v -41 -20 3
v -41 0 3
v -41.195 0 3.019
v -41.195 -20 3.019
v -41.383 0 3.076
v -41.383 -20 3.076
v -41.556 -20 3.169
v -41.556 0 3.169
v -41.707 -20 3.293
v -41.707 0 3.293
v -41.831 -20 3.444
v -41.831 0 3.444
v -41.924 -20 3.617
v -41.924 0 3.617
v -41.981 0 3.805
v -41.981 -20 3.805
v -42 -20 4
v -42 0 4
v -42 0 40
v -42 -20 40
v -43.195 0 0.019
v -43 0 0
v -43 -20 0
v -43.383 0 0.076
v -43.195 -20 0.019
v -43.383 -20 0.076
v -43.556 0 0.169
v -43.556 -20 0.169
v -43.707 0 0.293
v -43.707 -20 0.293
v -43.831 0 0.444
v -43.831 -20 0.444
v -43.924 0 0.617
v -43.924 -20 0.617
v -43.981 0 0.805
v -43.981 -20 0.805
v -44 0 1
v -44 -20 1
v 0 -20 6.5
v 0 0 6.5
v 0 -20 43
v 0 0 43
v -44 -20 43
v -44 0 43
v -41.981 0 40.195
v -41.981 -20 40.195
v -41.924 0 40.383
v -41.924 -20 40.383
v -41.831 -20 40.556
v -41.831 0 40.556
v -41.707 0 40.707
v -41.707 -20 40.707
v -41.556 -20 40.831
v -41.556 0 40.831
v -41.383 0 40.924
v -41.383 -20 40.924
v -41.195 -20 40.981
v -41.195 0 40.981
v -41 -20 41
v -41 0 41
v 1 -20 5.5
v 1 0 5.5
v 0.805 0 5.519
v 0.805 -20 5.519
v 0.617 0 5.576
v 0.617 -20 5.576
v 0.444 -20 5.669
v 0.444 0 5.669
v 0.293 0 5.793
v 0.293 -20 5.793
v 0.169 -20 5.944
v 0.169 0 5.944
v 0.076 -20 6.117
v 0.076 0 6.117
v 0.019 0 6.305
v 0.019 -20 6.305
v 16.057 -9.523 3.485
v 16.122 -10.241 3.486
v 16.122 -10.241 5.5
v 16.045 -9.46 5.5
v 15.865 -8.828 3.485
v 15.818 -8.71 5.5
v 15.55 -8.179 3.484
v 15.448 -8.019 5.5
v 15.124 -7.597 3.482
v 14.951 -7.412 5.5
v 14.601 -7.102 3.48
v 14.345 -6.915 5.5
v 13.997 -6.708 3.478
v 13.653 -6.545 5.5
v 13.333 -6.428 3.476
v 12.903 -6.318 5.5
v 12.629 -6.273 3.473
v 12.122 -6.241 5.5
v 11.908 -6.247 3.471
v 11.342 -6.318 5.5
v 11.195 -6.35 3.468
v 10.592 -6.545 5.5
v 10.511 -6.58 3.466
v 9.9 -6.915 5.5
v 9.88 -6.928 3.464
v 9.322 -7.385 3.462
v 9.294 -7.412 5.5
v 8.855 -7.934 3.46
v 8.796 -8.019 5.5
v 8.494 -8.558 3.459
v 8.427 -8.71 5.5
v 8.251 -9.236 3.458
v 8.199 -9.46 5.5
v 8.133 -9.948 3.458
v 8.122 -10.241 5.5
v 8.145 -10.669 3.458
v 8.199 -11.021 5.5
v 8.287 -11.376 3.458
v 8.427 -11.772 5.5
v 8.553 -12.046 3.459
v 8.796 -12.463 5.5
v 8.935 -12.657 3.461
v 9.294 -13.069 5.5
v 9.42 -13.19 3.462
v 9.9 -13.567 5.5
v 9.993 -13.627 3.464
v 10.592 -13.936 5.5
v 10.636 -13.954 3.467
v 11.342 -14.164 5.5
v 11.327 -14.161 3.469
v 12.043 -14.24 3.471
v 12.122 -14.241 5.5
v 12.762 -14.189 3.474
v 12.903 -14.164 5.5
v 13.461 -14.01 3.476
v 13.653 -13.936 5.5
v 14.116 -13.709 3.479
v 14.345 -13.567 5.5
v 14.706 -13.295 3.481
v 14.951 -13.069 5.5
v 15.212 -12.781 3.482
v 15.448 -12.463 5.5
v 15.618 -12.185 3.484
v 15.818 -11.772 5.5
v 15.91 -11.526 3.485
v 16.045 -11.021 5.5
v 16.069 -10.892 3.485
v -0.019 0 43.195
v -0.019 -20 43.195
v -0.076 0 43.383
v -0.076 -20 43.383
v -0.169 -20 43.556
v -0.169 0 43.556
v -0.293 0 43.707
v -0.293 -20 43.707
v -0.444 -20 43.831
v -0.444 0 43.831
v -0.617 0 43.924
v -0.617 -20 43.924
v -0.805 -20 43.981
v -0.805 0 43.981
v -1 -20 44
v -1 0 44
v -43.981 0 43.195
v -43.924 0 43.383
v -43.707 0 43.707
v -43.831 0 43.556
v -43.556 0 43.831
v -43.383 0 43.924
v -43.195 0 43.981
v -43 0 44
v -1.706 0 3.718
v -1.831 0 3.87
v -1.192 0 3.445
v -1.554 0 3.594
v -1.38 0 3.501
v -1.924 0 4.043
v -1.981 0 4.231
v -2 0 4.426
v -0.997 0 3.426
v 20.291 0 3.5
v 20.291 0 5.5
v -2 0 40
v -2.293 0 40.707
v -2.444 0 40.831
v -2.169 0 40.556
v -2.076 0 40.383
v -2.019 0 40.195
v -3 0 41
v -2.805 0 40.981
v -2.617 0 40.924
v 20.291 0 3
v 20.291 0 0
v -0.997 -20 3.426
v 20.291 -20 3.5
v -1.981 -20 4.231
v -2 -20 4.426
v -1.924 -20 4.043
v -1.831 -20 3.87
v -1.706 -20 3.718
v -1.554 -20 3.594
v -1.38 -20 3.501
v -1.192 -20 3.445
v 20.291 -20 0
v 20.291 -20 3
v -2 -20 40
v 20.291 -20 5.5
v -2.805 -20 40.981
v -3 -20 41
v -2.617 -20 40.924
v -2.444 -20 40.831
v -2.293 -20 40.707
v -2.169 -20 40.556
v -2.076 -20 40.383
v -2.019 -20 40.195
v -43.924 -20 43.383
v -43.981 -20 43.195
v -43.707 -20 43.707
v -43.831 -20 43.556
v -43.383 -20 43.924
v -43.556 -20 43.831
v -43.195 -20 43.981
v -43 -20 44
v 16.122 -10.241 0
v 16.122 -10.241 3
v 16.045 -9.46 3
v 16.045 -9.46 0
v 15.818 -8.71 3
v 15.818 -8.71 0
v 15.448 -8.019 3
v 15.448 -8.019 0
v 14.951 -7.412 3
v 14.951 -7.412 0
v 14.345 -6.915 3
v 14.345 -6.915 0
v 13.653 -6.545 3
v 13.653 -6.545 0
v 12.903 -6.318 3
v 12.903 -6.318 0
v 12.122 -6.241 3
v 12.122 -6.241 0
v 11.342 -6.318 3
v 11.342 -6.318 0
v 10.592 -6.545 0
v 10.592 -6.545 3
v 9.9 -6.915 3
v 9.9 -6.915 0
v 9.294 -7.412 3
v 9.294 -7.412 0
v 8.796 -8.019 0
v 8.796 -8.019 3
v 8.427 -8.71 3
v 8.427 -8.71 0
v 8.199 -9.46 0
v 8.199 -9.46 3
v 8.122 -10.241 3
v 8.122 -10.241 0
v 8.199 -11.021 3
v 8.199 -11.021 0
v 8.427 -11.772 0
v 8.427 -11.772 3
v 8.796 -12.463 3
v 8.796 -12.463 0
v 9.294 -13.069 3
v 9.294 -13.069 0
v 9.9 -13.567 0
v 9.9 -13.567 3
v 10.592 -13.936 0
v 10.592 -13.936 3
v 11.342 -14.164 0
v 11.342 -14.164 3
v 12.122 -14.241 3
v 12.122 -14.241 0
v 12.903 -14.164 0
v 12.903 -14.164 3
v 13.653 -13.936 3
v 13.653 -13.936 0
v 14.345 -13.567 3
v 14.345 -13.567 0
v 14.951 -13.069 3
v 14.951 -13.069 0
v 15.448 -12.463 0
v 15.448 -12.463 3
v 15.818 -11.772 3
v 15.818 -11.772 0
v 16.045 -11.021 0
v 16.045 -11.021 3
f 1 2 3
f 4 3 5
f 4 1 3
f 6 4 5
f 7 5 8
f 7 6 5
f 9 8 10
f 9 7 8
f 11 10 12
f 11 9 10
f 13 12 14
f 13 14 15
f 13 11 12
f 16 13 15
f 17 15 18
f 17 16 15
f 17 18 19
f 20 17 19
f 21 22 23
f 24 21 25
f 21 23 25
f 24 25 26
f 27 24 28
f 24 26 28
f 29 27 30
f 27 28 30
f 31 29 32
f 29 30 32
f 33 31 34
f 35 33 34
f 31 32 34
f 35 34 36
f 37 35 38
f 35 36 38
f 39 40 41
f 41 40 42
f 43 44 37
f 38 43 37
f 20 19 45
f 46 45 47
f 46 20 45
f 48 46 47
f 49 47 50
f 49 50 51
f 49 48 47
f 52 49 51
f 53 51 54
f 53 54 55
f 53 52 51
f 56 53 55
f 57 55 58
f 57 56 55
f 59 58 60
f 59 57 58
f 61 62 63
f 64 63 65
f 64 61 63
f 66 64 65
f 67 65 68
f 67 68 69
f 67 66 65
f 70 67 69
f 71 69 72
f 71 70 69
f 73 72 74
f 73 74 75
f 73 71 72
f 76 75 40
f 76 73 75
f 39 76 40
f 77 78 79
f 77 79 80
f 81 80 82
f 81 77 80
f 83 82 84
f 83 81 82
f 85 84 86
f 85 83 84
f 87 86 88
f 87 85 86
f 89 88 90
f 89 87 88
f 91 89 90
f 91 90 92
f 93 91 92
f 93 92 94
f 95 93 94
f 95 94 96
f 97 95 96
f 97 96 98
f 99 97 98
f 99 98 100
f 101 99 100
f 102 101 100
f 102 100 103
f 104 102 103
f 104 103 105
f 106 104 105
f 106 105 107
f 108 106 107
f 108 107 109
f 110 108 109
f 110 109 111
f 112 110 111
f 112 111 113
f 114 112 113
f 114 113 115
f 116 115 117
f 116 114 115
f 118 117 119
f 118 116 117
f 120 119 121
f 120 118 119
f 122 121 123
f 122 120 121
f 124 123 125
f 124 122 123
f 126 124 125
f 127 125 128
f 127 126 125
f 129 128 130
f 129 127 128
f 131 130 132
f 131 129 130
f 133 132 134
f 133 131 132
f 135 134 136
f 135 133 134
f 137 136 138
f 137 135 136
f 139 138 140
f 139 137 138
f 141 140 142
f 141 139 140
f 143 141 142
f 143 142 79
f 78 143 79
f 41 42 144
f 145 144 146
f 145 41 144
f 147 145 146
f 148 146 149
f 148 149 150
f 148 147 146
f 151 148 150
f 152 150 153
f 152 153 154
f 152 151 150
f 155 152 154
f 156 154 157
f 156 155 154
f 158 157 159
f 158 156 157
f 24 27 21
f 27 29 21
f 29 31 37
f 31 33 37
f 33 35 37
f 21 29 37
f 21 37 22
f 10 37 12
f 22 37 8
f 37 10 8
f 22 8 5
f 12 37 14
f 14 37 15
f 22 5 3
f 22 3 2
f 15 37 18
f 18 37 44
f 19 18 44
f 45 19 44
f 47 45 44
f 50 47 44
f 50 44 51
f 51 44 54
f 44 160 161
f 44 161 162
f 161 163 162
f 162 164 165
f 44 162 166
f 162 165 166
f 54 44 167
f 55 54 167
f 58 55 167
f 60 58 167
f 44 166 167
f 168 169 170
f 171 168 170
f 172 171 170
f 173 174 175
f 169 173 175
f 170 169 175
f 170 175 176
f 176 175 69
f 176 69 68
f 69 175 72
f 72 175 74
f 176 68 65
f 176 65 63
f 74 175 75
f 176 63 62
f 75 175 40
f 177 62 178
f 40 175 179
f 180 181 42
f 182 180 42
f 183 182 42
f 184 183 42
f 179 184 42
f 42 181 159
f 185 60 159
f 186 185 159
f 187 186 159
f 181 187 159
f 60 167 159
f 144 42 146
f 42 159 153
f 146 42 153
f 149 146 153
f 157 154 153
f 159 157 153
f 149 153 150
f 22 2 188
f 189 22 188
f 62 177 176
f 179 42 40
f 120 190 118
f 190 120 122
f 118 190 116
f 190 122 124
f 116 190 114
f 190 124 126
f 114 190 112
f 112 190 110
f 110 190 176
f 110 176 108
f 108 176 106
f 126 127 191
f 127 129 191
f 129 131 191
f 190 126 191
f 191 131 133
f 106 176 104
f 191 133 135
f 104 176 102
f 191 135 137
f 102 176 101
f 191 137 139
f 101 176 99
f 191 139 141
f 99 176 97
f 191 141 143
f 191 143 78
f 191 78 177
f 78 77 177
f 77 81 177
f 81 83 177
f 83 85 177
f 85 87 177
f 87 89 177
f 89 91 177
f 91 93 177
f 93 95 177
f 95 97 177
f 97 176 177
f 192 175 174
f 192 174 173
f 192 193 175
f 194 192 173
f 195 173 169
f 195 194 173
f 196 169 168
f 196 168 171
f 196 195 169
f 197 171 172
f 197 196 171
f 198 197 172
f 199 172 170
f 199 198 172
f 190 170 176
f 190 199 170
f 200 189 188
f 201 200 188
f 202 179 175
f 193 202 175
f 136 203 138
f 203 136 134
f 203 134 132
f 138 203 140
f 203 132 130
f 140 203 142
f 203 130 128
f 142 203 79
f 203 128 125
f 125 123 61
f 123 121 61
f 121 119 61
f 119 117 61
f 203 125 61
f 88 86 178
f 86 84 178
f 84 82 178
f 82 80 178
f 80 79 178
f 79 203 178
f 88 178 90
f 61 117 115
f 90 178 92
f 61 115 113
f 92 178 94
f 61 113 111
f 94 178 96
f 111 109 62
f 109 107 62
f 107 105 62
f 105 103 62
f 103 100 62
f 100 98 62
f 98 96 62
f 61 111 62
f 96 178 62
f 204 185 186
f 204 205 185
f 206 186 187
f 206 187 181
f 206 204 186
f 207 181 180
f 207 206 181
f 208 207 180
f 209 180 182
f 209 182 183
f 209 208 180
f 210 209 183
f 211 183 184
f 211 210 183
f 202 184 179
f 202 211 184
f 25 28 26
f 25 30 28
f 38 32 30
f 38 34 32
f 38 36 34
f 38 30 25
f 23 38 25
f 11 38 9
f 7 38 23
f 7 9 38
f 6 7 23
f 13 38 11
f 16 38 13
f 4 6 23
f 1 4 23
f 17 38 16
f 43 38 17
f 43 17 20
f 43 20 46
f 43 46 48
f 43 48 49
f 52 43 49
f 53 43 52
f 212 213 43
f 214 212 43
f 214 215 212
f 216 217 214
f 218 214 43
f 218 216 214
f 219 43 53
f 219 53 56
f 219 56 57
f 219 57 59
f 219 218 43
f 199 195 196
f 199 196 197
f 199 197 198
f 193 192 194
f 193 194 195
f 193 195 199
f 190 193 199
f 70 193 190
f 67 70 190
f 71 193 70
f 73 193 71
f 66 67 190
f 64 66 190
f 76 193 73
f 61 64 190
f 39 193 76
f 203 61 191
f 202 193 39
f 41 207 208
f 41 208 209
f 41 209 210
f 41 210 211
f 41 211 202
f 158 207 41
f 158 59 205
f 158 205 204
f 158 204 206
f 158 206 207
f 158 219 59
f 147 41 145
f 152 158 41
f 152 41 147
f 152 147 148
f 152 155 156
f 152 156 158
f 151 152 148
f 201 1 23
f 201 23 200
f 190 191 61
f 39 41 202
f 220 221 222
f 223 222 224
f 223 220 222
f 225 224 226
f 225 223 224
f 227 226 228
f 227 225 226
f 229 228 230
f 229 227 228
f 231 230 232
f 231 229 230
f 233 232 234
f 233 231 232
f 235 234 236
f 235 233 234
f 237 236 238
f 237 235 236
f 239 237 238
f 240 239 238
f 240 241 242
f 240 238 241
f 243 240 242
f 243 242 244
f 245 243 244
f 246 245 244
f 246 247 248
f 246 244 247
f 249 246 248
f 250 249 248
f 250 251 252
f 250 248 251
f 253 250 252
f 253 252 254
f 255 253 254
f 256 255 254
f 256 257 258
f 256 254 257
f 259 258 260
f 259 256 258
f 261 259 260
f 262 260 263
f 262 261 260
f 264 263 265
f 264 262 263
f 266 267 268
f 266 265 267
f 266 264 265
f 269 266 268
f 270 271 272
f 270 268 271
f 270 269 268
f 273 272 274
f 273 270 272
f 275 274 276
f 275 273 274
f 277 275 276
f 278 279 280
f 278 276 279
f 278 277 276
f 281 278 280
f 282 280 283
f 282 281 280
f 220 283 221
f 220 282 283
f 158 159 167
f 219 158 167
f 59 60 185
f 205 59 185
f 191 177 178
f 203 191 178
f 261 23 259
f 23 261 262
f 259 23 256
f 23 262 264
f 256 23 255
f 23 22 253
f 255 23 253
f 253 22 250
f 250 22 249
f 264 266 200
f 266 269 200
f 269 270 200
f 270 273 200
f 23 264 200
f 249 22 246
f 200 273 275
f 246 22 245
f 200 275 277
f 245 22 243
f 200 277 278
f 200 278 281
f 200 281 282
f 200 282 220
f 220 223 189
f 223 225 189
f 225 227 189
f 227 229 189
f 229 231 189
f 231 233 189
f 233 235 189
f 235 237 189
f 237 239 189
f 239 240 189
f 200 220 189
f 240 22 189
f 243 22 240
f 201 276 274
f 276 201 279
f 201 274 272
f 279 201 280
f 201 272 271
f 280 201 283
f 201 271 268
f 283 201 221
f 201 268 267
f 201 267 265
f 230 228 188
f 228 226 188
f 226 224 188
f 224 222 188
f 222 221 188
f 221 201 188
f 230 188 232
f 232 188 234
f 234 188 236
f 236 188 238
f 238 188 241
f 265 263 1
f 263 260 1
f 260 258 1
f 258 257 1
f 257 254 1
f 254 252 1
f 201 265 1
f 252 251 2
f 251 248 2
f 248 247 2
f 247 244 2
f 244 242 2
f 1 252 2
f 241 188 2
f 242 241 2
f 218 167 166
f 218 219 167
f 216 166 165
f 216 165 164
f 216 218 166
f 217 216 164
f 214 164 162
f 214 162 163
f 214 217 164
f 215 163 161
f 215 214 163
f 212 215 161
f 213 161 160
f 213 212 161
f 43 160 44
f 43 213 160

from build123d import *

# Parameters (mm, degrees)
F1_DEPTH = 20
F2_R     = 1
F3_R     = 4
F4_DEPTH = 23.2


with BuildPart() as f1:
    # F0 (on Front) → F1 (new body)
    with BuildSketch(Plane.XZ):
        Polygon((-44, 0), (20.290818, 0), (20.290818, 3), (-2, 3), (-42, 3), (-42, 41), (-2, 41), (-2, 3.422746), (20.290818, 3.5), (20.290818, 5.5), (0, 5.5), (0, 44), (-44, 44), align=None)
    extrude(amount=F1_DEPTH)

    # F2
    f2_edges = [f1.edges().sort_by_distance(p)[0] for p in [
        (-2, -10, 41),
        (-42, -10, 41),
        (-42, -10, 3),
        (0, -10, 5.5),
        (0, -10, 44),
        (-44, -10, 44),
        (-44, -10, 0),
        (-2, -10, 3.422746),
    ]]
    fillet(f2_edges, radius=F2_R)

    # F3 (on Top) → F4 (cut)
    with BuildSketch(Plane.XY):
        with Locations((12.122351, -10.240848)):
            Circle(F3_R)
    extrude(amount=F4_DEPTH, mode=Mode.SUBTRACT)


solid = f1.part
